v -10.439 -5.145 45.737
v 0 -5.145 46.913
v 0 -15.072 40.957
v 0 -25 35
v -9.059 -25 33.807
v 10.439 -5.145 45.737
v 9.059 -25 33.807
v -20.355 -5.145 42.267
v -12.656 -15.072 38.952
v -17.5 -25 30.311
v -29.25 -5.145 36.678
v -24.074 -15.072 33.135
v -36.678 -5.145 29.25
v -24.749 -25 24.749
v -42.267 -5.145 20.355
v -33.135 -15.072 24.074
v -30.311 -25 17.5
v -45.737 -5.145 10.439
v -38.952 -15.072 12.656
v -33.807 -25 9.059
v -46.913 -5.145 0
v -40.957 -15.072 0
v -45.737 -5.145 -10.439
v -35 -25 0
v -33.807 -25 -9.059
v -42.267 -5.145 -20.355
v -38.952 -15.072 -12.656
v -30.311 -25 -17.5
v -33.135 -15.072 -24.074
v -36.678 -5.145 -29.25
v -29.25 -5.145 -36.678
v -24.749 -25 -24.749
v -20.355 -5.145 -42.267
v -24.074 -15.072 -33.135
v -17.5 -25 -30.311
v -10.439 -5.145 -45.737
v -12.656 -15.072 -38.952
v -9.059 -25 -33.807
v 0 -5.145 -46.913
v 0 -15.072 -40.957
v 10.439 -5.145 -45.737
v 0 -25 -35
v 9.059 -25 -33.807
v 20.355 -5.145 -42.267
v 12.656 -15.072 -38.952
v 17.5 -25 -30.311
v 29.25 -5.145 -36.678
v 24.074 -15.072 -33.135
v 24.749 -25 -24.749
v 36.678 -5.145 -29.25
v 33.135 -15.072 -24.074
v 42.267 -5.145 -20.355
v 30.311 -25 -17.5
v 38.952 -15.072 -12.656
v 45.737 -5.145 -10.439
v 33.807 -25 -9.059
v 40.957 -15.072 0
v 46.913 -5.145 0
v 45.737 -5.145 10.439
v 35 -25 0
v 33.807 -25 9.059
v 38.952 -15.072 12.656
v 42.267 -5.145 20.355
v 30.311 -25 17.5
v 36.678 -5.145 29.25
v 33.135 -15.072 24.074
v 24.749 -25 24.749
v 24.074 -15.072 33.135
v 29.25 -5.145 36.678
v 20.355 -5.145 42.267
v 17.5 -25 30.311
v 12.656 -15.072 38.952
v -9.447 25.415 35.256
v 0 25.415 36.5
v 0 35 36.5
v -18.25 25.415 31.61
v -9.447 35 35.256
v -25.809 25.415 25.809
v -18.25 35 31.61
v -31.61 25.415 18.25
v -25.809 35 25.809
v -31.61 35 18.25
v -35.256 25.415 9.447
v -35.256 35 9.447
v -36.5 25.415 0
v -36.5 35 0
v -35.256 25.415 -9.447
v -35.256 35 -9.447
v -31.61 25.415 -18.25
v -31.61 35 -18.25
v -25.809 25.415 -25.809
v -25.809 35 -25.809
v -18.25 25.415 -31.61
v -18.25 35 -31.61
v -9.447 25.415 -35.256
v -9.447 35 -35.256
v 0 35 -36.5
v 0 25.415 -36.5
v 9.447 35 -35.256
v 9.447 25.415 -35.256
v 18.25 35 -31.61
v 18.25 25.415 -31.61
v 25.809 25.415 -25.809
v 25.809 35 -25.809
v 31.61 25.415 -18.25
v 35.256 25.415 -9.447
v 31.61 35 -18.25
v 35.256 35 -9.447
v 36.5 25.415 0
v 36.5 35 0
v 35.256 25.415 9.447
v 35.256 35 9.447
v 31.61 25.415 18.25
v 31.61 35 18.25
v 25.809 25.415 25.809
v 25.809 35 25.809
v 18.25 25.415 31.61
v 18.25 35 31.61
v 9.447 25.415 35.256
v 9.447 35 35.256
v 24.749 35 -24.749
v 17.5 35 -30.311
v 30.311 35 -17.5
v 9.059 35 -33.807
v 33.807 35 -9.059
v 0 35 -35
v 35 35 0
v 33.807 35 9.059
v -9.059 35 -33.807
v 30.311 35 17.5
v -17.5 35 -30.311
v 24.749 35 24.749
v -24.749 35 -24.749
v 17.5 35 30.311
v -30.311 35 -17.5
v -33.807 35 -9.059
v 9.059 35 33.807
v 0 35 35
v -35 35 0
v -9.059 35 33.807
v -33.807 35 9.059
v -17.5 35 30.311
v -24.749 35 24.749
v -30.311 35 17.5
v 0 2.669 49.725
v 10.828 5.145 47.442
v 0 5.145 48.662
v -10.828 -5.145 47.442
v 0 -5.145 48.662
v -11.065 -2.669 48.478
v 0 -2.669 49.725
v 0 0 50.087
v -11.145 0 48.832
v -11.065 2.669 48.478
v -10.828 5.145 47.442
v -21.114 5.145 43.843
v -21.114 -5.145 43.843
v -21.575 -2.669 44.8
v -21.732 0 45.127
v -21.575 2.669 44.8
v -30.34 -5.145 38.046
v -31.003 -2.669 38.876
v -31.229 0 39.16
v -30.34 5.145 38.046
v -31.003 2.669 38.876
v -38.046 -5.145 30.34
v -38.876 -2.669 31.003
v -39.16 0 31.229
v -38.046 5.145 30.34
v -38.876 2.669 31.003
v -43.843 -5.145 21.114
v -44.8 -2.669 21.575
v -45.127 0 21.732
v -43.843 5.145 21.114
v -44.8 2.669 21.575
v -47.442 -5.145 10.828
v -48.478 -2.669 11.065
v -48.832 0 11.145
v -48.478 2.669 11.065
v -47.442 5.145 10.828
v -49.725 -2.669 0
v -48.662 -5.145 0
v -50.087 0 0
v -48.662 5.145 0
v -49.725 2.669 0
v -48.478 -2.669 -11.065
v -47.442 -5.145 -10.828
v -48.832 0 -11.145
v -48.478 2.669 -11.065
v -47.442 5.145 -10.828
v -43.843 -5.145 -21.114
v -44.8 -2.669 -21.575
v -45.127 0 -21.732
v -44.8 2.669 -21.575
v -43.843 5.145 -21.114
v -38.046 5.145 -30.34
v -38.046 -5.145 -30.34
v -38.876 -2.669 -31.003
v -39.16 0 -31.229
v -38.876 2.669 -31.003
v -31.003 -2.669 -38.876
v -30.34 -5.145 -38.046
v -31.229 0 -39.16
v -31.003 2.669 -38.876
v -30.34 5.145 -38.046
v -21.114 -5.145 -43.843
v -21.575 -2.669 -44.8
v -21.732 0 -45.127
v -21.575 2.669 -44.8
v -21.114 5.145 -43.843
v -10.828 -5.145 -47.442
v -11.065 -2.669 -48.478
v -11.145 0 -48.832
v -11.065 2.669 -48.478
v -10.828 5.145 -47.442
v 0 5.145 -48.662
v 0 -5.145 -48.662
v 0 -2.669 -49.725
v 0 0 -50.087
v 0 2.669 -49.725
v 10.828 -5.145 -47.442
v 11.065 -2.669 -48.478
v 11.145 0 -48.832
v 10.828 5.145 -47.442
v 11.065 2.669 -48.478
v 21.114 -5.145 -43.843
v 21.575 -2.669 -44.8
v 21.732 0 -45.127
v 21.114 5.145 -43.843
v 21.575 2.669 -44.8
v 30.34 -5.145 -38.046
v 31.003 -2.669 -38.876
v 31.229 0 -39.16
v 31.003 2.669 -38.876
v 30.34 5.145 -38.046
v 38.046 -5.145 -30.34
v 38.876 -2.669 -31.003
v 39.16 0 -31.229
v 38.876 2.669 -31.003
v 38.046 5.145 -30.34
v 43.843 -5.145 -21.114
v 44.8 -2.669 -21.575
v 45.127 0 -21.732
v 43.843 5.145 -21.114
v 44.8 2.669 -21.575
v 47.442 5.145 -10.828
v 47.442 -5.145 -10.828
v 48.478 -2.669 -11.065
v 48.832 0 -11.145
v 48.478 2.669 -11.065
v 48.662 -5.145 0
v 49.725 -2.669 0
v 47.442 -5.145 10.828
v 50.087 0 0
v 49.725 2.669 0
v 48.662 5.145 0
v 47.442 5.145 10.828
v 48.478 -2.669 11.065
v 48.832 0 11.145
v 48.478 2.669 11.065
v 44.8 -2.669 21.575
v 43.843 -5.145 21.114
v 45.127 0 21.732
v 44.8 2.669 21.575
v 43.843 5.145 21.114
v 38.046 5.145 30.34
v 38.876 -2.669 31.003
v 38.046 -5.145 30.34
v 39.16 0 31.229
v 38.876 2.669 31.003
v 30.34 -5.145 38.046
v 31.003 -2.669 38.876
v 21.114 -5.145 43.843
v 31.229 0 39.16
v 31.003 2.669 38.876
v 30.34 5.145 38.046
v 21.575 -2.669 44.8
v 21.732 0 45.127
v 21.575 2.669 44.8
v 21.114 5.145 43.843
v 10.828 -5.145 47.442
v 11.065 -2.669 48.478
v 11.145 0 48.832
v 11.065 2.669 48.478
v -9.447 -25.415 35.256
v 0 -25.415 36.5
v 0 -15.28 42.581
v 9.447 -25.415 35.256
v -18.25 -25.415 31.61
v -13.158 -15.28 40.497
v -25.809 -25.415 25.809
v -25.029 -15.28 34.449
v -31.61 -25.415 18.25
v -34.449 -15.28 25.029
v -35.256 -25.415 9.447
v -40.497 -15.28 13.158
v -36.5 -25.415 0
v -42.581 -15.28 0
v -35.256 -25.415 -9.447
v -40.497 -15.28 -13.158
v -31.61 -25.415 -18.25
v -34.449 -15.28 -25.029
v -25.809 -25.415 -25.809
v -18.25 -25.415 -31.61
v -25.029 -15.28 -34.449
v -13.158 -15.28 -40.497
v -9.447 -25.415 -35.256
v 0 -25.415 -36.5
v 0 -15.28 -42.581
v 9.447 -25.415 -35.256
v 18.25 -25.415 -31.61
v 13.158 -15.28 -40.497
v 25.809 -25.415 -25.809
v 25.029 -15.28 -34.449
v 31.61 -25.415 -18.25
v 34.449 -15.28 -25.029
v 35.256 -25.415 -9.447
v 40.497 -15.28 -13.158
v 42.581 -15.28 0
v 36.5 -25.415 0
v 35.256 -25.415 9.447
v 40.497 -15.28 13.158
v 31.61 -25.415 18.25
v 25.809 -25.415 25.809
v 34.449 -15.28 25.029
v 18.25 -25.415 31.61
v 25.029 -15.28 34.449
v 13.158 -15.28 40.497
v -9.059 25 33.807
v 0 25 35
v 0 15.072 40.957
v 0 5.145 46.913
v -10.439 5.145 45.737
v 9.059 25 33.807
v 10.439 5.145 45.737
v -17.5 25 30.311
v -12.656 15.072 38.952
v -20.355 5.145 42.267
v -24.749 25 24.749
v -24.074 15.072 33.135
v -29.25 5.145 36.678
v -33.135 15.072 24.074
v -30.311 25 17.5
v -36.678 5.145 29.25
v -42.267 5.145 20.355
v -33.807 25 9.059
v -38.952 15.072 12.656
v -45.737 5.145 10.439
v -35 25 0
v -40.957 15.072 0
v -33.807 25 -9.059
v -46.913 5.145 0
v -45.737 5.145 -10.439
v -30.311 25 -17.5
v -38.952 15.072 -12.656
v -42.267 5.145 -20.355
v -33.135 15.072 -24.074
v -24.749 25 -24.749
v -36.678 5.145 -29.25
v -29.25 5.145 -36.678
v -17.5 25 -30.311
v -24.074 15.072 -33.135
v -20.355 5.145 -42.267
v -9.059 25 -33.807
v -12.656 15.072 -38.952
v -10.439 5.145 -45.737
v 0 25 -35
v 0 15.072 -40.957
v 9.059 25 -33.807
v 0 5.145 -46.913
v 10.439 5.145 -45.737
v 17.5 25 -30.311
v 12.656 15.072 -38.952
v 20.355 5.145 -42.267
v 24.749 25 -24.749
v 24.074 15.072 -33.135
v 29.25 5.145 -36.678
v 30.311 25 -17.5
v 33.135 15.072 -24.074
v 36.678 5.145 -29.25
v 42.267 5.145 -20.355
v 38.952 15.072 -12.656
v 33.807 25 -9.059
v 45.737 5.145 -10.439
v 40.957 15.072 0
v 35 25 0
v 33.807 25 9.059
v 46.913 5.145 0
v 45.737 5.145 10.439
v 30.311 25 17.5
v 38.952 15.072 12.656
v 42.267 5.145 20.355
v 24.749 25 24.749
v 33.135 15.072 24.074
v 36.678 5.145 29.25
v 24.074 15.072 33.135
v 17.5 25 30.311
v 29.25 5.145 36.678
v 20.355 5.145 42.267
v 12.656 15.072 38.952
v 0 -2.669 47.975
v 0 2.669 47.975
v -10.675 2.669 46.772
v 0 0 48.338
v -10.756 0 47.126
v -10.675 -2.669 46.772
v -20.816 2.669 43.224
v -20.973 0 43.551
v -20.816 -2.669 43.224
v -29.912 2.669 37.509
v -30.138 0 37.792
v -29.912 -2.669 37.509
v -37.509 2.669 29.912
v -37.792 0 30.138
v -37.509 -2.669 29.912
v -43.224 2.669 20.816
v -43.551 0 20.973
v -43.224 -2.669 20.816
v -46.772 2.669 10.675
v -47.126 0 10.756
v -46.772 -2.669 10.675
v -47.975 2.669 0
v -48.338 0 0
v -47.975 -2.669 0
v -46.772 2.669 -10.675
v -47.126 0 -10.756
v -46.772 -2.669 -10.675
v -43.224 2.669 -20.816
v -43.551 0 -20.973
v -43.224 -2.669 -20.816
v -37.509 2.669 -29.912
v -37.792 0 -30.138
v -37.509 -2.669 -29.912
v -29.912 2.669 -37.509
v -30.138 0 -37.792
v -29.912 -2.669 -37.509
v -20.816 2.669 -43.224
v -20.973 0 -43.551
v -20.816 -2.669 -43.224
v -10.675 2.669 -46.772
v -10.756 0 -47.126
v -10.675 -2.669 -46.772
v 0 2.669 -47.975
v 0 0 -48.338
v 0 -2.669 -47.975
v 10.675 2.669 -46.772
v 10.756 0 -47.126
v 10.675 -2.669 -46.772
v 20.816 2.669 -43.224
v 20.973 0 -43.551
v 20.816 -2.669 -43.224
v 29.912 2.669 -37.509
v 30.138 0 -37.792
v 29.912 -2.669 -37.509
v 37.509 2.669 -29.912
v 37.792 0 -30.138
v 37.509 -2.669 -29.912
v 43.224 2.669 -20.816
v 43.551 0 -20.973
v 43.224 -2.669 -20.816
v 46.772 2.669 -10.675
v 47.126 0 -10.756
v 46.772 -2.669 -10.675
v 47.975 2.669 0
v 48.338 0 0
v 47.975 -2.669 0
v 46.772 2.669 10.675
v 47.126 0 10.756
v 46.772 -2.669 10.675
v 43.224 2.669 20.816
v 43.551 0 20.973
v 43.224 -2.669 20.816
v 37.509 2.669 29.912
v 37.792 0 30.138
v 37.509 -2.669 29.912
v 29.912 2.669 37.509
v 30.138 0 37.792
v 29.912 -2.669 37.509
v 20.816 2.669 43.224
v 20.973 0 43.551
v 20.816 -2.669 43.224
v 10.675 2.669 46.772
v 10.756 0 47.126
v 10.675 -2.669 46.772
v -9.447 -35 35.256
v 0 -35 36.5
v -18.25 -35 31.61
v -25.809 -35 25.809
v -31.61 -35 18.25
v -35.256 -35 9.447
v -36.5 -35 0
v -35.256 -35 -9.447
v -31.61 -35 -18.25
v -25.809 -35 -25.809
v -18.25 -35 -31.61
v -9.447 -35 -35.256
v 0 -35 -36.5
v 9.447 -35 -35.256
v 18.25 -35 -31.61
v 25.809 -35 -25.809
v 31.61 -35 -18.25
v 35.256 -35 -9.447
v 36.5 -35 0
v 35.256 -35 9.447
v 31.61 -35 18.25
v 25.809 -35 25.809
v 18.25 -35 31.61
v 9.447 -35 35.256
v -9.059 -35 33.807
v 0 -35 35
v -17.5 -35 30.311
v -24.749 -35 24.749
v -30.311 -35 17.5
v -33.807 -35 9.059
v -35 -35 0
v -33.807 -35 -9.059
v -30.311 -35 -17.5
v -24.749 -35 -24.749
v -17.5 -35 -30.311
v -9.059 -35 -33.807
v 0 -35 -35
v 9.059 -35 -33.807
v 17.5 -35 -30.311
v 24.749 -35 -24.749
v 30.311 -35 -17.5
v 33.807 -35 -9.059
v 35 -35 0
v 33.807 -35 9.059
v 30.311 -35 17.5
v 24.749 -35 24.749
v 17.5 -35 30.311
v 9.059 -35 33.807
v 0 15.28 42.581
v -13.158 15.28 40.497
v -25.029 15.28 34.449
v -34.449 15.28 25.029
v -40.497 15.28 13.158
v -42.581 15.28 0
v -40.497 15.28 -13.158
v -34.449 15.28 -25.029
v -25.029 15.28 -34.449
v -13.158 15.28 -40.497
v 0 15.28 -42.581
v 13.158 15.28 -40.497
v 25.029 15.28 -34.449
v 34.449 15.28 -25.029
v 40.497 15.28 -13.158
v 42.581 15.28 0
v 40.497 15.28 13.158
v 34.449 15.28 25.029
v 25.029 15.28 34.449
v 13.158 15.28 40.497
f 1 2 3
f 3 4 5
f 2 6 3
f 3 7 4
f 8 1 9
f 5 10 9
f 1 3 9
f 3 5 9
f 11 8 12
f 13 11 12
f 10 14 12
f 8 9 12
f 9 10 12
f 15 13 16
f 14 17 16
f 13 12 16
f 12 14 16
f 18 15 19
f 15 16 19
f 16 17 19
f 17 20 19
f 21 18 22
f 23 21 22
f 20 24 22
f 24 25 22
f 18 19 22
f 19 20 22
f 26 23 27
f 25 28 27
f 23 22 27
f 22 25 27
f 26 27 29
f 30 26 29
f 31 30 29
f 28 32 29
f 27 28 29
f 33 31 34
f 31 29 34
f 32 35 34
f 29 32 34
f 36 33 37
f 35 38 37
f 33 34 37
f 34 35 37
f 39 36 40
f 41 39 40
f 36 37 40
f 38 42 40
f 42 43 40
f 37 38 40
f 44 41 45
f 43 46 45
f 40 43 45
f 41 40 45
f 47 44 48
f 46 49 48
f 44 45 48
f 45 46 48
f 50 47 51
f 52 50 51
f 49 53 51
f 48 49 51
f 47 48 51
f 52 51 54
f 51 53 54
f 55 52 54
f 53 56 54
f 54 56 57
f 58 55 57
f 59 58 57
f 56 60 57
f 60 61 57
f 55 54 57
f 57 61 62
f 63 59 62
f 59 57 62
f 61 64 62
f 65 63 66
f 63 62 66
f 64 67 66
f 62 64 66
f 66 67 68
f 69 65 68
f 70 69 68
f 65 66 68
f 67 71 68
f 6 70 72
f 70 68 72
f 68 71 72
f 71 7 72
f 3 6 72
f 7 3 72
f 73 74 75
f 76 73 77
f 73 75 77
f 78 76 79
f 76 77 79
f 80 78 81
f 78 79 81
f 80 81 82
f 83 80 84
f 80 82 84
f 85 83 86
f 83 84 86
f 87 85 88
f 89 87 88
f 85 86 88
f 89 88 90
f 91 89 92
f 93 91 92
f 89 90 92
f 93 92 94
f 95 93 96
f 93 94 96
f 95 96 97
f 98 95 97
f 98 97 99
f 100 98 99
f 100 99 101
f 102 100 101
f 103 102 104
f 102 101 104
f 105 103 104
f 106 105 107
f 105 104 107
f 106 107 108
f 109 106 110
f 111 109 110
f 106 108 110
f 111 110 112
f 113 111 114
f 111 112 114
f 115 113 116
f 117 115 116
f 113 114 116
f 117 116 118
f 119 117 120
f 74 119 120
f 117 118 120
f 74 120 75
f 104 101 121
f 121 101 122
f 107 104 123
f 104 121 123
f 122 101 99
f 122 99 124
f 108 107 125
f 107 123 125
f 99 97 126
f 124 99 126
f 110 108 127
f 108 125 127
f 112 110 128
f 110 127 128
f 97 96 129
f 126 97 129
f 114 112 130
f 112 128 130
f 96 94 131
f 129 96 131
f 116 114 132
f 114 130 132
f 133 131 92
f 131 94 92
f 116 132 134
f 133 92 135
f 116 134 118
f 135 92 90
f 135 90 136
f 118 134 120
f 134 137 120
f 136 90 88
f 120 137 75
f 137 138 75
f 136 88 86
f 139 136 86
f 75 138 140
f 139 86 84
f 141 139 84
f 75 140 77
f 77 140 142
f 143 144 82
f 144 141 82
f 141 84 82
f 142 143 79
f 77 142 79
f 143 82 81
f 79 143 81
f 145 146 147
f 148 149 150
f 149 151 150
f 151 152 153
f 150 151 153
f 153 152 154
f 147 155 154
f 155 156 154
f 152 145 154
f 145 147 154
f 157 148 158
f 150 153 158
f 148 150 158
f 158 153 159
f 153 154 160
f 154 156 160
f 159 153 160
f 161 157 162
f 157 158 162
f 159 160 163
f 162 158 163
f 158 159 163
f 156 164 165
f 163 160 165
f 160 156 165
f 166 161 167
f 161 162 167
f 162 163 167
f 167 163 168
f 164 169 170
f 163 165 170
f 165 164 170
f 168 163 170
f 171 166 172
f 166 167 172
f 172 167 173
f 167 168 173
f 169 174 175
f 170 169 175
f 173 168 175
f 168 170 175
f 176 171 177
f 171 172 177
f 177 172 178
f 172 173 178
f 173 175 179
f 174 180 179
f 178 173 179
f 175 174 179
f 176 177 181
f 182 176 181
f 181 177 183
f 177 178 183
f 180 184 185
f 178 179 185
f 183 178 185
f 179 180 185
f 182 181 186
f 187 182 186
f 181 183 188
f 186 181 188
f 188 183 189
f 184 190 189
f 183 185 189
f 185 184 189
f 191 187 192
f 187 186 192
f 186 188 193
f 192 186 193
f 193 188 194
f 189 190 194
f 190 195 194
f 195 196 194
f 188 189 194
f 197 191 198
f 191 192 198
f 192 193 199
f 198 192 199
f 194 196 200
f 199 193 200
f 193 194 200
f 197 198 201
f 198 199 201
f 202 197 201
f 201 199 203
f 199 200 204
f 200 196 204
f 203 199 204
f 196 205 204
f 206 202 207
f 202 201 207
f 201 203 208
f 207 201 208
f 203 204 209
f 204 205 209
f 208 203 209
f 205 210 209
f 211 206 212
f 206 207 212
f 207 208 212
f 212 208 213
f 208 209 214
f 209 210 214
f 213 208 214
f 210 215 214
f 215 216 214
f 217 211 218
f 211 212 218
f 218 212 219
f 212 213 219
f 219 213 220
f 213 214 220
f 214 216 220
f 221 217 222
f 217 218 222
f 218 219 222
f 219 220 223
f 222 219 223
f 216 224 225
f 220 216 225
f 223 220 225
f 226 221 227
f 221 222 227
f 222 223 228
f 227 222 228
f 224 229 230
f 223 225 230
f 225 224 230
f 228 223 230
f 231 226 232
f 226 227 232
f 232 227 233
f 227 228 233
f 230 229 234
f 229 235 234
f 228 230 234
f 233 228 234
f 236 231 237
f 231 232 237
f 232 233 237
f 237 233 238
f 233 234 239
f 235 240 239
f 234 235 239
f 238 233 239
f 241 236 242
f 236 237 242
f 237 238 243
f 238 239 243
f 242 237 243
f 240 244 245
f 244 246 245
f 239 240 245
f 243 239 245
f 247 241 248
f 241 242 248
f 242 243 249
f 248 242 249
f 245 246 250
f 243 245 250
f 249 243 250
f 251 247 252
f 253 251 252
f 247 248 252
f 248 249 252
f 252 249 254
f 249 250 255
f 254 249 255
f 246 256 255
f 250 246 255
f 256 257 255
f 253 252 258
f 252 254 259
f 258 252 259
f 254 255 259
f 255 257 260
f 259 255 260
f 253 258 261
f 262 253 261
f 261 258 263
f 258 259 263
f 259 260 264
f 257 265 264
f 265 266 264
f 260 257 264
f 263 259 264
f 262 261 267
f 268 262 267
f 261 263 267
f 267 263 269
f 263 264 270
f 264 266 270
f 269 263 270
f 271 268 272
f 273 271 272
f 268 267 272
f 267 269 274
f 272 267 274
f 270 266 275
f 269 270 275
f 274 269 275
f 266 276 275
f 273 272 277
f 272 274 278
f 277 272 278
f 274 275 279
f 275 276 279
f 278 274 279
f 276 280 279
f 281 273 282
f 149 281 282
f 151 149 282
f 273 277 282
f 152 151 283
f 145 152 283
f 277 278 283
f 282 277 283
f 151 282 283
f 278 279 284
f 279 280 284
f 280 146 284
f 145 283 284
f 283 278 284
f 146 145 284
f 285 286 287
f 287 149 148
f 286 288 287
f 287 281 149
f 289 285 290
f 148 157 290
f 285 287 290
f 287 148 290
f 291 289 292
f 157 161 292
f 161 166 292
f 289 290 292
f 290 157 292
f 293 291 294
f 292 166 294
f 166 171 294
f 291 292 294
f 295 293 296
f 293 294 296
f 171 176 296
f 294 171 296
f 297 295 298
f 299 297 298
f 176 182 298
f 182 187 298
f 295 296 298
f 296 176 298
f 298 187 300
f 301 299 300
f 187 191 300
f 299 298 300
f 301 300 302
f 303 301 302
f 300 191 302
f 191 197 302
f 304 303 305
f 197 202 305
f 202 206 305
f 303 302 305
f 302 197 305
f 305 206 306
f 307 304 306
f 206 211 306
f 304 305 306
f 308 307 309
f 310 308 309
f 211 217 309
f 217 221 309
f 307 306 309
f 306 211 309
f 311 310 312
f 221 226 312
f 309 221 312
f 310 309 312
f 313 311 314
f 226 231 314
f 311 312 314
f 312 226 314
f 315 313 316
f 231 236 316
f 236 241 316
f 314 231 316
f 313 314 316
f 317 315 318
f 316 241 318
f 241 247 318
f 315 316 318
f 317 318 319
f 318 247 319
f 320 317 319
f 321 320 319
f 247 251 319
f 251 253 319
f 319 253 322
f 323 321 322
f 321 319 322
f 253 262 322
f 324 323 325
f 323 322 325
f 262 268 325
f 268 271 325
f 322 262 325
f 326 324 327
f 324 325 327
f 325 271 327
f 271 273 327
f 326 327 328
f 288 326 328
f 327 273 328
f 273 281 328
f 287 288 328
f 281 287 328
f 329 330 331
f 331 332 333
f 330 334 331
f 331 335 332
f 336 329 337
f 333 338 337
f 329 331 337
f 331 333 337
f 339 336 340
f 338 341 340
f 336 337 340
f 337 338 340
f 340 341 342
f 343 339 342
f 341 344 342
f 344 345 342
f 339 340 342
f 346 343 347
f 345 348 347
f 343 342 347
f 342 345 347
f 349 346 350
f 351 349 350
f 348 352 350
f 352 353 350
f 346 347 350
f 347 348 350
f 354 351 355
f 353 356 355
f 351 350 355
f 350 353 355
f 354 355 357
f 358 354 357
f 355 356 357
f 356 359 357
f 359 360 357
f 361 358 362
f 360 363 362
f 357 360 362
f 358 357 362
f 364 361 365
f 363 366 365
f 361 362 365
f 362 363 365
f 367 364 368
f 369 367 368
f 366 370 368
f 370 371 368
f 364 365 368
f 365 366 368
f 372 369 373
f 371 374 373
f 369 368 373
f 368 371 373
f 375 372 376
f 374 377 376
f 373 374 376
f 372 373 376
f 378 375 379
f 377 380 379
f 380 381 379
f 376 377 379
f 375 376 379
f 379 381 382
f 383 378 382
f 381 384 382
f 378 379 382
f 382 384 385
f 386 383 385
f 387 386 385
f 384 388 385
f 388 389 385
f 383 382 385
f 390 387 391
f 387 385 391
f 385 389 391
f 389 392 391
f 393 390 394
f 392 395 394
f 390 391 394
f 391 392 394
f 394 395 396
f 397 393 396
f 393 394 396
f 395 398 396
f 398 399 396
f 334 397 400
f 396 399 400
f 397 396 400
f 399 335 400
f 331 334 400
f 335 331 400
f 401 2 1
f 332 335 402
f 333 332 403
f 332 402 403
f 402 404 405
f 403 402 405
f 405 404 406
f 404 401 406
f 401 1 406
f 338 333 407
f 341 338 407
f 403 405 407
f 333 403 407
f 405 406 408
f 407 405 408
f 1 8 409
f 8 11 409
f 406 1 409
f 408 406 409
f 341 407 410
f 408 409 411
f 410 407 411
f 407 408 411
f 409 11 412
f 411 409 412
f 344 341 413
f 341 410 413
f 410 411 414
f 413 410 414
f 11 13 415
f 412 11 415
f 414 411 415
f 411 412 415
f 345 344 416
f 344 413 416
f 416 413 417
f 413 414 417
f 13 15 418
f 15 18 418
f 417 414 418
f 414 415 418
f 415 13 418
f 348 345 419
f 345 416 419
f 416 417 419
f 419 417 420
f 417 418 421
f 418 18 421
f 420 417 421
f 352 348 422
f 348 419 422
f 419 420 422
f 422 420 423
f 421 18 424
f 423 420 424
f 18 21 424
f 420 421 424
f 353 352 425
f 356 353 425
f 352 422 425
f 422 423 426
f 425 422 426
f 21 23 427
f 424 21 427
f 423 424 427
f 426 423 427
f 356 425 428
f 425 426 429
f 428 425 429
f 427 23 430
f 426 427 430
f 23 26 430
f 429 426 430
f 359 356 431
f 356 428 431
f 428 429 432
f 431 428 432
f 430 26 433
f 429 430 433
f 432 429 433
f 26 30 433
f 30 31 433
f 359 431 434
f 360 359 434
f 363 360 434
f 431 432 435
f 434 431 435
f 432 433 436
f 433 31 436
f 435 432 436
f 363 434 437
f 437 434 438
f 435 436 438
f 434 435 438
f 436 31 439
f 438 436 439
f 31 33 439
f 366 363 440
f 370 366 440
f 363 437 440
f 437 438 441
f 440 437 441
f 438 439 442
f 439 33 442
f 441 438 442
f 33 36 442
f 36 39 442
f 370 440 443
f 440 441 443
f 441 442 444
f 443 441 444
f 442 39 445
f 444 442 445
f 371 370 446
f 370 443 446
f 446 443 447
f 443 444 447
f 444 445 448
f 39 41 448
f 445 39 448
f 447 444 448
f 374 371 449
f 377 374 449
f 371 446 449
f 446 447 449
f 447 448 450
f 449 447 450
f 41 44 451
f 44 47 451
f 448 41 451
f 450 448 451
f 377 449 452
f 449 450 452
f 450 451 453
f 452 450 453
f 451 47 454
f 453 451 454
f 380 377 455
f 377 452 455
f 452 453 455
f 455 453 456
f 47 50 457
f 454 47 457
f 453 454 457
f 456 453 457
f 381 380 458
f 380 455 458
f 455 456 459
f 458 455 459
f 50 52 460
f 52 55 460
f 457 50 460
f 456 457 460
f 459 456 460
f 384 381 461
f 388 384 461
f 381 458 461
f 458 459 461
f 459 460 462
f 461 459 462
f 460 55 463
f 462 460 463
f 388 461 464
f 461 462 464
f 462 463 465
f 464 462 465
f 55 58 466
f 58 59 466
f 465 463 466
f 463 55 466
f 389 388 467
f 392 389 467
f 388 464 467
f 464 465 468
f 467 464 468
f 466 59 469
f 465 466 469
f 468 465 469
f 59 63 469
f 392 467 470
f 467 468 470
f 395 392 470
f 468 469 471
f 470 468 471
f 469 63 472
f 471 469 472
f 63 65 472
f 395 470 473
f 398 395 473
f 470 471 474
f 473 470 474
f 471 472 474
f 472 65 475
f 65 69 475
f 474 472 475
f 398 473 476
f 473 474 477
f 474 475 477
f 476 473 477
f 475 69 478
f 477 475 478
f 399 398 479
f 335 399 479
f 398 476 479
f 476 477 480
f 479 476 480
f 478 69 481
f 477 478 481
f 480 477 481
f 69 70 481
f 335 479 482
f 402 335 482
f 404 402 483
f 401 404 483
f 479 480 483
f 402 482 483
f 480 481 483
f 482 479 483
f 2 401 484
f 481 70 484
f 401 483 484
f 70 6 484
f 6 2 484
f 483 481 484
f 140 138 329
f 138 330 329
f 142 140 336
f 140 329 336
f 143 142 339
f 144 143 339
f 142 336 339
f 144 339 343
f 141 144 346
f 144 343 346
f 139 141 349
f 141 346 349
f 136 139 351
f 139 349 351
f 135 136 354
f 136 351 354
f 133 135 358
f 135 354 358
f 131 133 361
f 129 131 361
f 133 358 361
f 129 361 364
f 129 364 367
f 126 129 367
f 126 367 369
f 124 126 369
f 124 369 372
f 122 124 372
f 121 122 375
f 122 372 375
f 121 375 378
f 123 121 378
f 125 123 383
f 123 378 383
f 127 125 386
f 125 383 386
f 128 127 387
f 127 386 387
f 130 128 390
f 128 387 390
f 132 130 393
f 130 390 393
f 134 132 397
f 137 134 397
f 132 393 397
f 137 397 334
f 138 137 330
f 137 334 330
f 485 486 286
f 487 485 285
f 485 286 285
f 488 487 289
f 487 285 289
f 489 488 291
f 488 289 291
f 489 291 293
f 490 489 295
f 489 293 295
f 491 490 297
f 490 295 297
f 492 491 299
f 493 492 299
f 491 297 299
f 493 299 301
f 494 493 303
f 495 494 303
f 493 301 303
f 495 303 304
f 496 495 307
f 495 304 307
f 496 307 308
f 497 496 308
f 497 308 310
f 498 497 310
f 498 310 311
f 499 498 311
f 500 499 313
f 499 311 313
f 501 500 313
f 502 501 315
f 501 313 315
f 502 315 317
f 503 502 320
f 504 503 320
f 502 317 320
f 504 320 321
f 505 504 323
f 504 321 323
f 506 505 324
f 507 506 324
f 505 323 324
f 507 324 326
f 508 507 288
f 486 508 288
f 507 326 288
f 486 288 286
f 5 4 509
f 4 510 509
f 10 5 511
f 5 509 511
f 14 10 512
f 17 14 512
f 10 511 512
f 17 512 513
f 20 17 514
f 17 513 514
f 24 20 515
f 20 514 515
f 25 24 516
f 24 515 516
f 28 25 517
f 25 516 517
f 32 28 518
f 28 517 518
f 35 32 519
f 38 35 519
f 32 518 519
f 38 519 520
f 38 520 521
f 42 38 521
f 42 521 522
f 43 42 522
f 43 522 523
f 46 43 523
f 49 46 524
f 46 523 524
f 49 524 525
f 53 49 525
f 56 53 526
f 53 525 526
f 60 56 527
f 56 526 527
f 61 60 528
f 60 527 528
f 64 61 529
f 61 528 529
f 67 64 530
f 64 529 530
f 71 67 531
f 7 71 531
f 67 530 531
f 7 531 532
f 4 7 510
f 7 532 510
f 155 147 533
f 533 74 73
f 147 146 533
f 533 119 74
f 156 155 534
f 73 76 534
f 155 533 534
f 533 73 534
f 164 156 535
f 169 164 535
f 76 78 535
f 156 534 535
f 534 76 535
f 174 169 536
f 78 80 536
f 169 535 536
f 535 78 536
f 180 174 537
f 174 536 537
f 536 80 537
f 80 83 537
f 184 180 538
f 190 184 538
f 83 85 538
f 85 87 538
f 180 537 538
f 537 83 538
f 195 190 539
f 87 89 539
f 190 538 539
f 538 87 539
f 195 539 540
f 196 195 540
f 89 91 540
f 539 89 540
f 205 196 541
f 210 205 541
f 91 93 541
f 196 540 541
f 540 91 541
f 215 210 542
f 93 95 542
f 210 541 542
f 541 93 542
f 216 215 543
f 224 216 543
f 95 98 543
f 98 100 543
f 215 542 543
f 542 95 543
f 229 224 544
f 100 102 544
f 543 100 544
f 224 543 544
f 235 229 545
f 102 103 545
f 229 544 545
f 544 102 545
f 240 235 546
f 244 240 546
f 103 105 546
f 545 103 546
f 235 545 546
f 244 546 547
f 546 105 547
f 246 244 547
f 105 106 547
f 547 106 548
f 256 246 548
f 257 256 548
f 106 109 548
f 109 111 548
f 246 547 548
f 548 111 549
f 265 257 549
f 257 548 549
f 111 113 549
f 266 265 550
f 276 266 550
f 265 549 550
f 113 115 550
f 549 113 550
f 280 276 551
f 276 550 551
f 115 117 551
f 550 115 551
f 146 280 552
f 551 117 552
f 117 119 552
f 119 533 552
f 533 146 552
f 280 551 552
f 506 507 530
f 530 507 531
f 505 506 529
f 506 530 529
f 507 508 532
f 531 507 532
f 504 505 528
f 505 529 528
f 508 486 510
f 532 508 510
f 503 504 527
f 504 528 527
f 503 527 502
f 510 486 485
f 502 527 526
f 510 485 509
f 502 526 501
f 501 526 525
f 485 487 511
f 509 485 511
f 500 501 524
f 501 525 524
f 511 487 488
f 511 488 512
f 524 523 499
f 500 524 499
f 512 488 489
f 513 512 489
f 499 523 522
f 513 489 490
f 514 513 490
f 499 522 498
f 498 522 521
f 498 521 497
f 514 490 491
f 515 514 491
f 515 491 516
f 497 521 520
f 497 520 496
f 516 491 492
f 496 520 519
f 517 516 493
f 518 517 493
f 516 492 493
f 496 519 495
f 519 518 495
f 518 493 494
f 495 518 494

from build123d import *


with BuildPart() as part:
    # Sketch1 → Revolve1 (revolve)
    with BuildSketch(Plane.XY, mode=Mode.PRIVATE) as revolve1_sk:
        with BuildLine():
            Line((-35, 35), (-35, 25))
            Line((-35, 25), (-46.913025467, 5.144957554))
            ThreePointArc((-46.913025467, 5.144957554), (-48.33809621, 0), (-46.913025467, -5.144957554))
            Line((-46.913025467, -5.144957554), (-35, -25))
            Line((-35, -25), (-35, -35))
            Line((-35, -35), (-36.5, -35))
            Line((-36.5, -35), (-36.5, -25.415475947))
            Line((-36.5, -25.415475947), (-48.662311036, -5.144957554))
            ThreePointArc((-48.662311036, -5.144957554), (-50.087381779, 0), (-48.662311036, 5.144957554))
            Line((-48.662311036, 5.144957554), (-36.5, 25.415475947))
            Line((-36.5, 25.415475947), (-36.5, 35))
            Line((-36.5, 35), (-35, 35))
        make_face()
    revolve(revolve1_sk.sketch.rotate(Axis((0, 85.826086957, 0), (0, -1, 0)), 270), axis=Axis((0, 85.826086957, 0), (0, -1, 0)))


solid = part.part
